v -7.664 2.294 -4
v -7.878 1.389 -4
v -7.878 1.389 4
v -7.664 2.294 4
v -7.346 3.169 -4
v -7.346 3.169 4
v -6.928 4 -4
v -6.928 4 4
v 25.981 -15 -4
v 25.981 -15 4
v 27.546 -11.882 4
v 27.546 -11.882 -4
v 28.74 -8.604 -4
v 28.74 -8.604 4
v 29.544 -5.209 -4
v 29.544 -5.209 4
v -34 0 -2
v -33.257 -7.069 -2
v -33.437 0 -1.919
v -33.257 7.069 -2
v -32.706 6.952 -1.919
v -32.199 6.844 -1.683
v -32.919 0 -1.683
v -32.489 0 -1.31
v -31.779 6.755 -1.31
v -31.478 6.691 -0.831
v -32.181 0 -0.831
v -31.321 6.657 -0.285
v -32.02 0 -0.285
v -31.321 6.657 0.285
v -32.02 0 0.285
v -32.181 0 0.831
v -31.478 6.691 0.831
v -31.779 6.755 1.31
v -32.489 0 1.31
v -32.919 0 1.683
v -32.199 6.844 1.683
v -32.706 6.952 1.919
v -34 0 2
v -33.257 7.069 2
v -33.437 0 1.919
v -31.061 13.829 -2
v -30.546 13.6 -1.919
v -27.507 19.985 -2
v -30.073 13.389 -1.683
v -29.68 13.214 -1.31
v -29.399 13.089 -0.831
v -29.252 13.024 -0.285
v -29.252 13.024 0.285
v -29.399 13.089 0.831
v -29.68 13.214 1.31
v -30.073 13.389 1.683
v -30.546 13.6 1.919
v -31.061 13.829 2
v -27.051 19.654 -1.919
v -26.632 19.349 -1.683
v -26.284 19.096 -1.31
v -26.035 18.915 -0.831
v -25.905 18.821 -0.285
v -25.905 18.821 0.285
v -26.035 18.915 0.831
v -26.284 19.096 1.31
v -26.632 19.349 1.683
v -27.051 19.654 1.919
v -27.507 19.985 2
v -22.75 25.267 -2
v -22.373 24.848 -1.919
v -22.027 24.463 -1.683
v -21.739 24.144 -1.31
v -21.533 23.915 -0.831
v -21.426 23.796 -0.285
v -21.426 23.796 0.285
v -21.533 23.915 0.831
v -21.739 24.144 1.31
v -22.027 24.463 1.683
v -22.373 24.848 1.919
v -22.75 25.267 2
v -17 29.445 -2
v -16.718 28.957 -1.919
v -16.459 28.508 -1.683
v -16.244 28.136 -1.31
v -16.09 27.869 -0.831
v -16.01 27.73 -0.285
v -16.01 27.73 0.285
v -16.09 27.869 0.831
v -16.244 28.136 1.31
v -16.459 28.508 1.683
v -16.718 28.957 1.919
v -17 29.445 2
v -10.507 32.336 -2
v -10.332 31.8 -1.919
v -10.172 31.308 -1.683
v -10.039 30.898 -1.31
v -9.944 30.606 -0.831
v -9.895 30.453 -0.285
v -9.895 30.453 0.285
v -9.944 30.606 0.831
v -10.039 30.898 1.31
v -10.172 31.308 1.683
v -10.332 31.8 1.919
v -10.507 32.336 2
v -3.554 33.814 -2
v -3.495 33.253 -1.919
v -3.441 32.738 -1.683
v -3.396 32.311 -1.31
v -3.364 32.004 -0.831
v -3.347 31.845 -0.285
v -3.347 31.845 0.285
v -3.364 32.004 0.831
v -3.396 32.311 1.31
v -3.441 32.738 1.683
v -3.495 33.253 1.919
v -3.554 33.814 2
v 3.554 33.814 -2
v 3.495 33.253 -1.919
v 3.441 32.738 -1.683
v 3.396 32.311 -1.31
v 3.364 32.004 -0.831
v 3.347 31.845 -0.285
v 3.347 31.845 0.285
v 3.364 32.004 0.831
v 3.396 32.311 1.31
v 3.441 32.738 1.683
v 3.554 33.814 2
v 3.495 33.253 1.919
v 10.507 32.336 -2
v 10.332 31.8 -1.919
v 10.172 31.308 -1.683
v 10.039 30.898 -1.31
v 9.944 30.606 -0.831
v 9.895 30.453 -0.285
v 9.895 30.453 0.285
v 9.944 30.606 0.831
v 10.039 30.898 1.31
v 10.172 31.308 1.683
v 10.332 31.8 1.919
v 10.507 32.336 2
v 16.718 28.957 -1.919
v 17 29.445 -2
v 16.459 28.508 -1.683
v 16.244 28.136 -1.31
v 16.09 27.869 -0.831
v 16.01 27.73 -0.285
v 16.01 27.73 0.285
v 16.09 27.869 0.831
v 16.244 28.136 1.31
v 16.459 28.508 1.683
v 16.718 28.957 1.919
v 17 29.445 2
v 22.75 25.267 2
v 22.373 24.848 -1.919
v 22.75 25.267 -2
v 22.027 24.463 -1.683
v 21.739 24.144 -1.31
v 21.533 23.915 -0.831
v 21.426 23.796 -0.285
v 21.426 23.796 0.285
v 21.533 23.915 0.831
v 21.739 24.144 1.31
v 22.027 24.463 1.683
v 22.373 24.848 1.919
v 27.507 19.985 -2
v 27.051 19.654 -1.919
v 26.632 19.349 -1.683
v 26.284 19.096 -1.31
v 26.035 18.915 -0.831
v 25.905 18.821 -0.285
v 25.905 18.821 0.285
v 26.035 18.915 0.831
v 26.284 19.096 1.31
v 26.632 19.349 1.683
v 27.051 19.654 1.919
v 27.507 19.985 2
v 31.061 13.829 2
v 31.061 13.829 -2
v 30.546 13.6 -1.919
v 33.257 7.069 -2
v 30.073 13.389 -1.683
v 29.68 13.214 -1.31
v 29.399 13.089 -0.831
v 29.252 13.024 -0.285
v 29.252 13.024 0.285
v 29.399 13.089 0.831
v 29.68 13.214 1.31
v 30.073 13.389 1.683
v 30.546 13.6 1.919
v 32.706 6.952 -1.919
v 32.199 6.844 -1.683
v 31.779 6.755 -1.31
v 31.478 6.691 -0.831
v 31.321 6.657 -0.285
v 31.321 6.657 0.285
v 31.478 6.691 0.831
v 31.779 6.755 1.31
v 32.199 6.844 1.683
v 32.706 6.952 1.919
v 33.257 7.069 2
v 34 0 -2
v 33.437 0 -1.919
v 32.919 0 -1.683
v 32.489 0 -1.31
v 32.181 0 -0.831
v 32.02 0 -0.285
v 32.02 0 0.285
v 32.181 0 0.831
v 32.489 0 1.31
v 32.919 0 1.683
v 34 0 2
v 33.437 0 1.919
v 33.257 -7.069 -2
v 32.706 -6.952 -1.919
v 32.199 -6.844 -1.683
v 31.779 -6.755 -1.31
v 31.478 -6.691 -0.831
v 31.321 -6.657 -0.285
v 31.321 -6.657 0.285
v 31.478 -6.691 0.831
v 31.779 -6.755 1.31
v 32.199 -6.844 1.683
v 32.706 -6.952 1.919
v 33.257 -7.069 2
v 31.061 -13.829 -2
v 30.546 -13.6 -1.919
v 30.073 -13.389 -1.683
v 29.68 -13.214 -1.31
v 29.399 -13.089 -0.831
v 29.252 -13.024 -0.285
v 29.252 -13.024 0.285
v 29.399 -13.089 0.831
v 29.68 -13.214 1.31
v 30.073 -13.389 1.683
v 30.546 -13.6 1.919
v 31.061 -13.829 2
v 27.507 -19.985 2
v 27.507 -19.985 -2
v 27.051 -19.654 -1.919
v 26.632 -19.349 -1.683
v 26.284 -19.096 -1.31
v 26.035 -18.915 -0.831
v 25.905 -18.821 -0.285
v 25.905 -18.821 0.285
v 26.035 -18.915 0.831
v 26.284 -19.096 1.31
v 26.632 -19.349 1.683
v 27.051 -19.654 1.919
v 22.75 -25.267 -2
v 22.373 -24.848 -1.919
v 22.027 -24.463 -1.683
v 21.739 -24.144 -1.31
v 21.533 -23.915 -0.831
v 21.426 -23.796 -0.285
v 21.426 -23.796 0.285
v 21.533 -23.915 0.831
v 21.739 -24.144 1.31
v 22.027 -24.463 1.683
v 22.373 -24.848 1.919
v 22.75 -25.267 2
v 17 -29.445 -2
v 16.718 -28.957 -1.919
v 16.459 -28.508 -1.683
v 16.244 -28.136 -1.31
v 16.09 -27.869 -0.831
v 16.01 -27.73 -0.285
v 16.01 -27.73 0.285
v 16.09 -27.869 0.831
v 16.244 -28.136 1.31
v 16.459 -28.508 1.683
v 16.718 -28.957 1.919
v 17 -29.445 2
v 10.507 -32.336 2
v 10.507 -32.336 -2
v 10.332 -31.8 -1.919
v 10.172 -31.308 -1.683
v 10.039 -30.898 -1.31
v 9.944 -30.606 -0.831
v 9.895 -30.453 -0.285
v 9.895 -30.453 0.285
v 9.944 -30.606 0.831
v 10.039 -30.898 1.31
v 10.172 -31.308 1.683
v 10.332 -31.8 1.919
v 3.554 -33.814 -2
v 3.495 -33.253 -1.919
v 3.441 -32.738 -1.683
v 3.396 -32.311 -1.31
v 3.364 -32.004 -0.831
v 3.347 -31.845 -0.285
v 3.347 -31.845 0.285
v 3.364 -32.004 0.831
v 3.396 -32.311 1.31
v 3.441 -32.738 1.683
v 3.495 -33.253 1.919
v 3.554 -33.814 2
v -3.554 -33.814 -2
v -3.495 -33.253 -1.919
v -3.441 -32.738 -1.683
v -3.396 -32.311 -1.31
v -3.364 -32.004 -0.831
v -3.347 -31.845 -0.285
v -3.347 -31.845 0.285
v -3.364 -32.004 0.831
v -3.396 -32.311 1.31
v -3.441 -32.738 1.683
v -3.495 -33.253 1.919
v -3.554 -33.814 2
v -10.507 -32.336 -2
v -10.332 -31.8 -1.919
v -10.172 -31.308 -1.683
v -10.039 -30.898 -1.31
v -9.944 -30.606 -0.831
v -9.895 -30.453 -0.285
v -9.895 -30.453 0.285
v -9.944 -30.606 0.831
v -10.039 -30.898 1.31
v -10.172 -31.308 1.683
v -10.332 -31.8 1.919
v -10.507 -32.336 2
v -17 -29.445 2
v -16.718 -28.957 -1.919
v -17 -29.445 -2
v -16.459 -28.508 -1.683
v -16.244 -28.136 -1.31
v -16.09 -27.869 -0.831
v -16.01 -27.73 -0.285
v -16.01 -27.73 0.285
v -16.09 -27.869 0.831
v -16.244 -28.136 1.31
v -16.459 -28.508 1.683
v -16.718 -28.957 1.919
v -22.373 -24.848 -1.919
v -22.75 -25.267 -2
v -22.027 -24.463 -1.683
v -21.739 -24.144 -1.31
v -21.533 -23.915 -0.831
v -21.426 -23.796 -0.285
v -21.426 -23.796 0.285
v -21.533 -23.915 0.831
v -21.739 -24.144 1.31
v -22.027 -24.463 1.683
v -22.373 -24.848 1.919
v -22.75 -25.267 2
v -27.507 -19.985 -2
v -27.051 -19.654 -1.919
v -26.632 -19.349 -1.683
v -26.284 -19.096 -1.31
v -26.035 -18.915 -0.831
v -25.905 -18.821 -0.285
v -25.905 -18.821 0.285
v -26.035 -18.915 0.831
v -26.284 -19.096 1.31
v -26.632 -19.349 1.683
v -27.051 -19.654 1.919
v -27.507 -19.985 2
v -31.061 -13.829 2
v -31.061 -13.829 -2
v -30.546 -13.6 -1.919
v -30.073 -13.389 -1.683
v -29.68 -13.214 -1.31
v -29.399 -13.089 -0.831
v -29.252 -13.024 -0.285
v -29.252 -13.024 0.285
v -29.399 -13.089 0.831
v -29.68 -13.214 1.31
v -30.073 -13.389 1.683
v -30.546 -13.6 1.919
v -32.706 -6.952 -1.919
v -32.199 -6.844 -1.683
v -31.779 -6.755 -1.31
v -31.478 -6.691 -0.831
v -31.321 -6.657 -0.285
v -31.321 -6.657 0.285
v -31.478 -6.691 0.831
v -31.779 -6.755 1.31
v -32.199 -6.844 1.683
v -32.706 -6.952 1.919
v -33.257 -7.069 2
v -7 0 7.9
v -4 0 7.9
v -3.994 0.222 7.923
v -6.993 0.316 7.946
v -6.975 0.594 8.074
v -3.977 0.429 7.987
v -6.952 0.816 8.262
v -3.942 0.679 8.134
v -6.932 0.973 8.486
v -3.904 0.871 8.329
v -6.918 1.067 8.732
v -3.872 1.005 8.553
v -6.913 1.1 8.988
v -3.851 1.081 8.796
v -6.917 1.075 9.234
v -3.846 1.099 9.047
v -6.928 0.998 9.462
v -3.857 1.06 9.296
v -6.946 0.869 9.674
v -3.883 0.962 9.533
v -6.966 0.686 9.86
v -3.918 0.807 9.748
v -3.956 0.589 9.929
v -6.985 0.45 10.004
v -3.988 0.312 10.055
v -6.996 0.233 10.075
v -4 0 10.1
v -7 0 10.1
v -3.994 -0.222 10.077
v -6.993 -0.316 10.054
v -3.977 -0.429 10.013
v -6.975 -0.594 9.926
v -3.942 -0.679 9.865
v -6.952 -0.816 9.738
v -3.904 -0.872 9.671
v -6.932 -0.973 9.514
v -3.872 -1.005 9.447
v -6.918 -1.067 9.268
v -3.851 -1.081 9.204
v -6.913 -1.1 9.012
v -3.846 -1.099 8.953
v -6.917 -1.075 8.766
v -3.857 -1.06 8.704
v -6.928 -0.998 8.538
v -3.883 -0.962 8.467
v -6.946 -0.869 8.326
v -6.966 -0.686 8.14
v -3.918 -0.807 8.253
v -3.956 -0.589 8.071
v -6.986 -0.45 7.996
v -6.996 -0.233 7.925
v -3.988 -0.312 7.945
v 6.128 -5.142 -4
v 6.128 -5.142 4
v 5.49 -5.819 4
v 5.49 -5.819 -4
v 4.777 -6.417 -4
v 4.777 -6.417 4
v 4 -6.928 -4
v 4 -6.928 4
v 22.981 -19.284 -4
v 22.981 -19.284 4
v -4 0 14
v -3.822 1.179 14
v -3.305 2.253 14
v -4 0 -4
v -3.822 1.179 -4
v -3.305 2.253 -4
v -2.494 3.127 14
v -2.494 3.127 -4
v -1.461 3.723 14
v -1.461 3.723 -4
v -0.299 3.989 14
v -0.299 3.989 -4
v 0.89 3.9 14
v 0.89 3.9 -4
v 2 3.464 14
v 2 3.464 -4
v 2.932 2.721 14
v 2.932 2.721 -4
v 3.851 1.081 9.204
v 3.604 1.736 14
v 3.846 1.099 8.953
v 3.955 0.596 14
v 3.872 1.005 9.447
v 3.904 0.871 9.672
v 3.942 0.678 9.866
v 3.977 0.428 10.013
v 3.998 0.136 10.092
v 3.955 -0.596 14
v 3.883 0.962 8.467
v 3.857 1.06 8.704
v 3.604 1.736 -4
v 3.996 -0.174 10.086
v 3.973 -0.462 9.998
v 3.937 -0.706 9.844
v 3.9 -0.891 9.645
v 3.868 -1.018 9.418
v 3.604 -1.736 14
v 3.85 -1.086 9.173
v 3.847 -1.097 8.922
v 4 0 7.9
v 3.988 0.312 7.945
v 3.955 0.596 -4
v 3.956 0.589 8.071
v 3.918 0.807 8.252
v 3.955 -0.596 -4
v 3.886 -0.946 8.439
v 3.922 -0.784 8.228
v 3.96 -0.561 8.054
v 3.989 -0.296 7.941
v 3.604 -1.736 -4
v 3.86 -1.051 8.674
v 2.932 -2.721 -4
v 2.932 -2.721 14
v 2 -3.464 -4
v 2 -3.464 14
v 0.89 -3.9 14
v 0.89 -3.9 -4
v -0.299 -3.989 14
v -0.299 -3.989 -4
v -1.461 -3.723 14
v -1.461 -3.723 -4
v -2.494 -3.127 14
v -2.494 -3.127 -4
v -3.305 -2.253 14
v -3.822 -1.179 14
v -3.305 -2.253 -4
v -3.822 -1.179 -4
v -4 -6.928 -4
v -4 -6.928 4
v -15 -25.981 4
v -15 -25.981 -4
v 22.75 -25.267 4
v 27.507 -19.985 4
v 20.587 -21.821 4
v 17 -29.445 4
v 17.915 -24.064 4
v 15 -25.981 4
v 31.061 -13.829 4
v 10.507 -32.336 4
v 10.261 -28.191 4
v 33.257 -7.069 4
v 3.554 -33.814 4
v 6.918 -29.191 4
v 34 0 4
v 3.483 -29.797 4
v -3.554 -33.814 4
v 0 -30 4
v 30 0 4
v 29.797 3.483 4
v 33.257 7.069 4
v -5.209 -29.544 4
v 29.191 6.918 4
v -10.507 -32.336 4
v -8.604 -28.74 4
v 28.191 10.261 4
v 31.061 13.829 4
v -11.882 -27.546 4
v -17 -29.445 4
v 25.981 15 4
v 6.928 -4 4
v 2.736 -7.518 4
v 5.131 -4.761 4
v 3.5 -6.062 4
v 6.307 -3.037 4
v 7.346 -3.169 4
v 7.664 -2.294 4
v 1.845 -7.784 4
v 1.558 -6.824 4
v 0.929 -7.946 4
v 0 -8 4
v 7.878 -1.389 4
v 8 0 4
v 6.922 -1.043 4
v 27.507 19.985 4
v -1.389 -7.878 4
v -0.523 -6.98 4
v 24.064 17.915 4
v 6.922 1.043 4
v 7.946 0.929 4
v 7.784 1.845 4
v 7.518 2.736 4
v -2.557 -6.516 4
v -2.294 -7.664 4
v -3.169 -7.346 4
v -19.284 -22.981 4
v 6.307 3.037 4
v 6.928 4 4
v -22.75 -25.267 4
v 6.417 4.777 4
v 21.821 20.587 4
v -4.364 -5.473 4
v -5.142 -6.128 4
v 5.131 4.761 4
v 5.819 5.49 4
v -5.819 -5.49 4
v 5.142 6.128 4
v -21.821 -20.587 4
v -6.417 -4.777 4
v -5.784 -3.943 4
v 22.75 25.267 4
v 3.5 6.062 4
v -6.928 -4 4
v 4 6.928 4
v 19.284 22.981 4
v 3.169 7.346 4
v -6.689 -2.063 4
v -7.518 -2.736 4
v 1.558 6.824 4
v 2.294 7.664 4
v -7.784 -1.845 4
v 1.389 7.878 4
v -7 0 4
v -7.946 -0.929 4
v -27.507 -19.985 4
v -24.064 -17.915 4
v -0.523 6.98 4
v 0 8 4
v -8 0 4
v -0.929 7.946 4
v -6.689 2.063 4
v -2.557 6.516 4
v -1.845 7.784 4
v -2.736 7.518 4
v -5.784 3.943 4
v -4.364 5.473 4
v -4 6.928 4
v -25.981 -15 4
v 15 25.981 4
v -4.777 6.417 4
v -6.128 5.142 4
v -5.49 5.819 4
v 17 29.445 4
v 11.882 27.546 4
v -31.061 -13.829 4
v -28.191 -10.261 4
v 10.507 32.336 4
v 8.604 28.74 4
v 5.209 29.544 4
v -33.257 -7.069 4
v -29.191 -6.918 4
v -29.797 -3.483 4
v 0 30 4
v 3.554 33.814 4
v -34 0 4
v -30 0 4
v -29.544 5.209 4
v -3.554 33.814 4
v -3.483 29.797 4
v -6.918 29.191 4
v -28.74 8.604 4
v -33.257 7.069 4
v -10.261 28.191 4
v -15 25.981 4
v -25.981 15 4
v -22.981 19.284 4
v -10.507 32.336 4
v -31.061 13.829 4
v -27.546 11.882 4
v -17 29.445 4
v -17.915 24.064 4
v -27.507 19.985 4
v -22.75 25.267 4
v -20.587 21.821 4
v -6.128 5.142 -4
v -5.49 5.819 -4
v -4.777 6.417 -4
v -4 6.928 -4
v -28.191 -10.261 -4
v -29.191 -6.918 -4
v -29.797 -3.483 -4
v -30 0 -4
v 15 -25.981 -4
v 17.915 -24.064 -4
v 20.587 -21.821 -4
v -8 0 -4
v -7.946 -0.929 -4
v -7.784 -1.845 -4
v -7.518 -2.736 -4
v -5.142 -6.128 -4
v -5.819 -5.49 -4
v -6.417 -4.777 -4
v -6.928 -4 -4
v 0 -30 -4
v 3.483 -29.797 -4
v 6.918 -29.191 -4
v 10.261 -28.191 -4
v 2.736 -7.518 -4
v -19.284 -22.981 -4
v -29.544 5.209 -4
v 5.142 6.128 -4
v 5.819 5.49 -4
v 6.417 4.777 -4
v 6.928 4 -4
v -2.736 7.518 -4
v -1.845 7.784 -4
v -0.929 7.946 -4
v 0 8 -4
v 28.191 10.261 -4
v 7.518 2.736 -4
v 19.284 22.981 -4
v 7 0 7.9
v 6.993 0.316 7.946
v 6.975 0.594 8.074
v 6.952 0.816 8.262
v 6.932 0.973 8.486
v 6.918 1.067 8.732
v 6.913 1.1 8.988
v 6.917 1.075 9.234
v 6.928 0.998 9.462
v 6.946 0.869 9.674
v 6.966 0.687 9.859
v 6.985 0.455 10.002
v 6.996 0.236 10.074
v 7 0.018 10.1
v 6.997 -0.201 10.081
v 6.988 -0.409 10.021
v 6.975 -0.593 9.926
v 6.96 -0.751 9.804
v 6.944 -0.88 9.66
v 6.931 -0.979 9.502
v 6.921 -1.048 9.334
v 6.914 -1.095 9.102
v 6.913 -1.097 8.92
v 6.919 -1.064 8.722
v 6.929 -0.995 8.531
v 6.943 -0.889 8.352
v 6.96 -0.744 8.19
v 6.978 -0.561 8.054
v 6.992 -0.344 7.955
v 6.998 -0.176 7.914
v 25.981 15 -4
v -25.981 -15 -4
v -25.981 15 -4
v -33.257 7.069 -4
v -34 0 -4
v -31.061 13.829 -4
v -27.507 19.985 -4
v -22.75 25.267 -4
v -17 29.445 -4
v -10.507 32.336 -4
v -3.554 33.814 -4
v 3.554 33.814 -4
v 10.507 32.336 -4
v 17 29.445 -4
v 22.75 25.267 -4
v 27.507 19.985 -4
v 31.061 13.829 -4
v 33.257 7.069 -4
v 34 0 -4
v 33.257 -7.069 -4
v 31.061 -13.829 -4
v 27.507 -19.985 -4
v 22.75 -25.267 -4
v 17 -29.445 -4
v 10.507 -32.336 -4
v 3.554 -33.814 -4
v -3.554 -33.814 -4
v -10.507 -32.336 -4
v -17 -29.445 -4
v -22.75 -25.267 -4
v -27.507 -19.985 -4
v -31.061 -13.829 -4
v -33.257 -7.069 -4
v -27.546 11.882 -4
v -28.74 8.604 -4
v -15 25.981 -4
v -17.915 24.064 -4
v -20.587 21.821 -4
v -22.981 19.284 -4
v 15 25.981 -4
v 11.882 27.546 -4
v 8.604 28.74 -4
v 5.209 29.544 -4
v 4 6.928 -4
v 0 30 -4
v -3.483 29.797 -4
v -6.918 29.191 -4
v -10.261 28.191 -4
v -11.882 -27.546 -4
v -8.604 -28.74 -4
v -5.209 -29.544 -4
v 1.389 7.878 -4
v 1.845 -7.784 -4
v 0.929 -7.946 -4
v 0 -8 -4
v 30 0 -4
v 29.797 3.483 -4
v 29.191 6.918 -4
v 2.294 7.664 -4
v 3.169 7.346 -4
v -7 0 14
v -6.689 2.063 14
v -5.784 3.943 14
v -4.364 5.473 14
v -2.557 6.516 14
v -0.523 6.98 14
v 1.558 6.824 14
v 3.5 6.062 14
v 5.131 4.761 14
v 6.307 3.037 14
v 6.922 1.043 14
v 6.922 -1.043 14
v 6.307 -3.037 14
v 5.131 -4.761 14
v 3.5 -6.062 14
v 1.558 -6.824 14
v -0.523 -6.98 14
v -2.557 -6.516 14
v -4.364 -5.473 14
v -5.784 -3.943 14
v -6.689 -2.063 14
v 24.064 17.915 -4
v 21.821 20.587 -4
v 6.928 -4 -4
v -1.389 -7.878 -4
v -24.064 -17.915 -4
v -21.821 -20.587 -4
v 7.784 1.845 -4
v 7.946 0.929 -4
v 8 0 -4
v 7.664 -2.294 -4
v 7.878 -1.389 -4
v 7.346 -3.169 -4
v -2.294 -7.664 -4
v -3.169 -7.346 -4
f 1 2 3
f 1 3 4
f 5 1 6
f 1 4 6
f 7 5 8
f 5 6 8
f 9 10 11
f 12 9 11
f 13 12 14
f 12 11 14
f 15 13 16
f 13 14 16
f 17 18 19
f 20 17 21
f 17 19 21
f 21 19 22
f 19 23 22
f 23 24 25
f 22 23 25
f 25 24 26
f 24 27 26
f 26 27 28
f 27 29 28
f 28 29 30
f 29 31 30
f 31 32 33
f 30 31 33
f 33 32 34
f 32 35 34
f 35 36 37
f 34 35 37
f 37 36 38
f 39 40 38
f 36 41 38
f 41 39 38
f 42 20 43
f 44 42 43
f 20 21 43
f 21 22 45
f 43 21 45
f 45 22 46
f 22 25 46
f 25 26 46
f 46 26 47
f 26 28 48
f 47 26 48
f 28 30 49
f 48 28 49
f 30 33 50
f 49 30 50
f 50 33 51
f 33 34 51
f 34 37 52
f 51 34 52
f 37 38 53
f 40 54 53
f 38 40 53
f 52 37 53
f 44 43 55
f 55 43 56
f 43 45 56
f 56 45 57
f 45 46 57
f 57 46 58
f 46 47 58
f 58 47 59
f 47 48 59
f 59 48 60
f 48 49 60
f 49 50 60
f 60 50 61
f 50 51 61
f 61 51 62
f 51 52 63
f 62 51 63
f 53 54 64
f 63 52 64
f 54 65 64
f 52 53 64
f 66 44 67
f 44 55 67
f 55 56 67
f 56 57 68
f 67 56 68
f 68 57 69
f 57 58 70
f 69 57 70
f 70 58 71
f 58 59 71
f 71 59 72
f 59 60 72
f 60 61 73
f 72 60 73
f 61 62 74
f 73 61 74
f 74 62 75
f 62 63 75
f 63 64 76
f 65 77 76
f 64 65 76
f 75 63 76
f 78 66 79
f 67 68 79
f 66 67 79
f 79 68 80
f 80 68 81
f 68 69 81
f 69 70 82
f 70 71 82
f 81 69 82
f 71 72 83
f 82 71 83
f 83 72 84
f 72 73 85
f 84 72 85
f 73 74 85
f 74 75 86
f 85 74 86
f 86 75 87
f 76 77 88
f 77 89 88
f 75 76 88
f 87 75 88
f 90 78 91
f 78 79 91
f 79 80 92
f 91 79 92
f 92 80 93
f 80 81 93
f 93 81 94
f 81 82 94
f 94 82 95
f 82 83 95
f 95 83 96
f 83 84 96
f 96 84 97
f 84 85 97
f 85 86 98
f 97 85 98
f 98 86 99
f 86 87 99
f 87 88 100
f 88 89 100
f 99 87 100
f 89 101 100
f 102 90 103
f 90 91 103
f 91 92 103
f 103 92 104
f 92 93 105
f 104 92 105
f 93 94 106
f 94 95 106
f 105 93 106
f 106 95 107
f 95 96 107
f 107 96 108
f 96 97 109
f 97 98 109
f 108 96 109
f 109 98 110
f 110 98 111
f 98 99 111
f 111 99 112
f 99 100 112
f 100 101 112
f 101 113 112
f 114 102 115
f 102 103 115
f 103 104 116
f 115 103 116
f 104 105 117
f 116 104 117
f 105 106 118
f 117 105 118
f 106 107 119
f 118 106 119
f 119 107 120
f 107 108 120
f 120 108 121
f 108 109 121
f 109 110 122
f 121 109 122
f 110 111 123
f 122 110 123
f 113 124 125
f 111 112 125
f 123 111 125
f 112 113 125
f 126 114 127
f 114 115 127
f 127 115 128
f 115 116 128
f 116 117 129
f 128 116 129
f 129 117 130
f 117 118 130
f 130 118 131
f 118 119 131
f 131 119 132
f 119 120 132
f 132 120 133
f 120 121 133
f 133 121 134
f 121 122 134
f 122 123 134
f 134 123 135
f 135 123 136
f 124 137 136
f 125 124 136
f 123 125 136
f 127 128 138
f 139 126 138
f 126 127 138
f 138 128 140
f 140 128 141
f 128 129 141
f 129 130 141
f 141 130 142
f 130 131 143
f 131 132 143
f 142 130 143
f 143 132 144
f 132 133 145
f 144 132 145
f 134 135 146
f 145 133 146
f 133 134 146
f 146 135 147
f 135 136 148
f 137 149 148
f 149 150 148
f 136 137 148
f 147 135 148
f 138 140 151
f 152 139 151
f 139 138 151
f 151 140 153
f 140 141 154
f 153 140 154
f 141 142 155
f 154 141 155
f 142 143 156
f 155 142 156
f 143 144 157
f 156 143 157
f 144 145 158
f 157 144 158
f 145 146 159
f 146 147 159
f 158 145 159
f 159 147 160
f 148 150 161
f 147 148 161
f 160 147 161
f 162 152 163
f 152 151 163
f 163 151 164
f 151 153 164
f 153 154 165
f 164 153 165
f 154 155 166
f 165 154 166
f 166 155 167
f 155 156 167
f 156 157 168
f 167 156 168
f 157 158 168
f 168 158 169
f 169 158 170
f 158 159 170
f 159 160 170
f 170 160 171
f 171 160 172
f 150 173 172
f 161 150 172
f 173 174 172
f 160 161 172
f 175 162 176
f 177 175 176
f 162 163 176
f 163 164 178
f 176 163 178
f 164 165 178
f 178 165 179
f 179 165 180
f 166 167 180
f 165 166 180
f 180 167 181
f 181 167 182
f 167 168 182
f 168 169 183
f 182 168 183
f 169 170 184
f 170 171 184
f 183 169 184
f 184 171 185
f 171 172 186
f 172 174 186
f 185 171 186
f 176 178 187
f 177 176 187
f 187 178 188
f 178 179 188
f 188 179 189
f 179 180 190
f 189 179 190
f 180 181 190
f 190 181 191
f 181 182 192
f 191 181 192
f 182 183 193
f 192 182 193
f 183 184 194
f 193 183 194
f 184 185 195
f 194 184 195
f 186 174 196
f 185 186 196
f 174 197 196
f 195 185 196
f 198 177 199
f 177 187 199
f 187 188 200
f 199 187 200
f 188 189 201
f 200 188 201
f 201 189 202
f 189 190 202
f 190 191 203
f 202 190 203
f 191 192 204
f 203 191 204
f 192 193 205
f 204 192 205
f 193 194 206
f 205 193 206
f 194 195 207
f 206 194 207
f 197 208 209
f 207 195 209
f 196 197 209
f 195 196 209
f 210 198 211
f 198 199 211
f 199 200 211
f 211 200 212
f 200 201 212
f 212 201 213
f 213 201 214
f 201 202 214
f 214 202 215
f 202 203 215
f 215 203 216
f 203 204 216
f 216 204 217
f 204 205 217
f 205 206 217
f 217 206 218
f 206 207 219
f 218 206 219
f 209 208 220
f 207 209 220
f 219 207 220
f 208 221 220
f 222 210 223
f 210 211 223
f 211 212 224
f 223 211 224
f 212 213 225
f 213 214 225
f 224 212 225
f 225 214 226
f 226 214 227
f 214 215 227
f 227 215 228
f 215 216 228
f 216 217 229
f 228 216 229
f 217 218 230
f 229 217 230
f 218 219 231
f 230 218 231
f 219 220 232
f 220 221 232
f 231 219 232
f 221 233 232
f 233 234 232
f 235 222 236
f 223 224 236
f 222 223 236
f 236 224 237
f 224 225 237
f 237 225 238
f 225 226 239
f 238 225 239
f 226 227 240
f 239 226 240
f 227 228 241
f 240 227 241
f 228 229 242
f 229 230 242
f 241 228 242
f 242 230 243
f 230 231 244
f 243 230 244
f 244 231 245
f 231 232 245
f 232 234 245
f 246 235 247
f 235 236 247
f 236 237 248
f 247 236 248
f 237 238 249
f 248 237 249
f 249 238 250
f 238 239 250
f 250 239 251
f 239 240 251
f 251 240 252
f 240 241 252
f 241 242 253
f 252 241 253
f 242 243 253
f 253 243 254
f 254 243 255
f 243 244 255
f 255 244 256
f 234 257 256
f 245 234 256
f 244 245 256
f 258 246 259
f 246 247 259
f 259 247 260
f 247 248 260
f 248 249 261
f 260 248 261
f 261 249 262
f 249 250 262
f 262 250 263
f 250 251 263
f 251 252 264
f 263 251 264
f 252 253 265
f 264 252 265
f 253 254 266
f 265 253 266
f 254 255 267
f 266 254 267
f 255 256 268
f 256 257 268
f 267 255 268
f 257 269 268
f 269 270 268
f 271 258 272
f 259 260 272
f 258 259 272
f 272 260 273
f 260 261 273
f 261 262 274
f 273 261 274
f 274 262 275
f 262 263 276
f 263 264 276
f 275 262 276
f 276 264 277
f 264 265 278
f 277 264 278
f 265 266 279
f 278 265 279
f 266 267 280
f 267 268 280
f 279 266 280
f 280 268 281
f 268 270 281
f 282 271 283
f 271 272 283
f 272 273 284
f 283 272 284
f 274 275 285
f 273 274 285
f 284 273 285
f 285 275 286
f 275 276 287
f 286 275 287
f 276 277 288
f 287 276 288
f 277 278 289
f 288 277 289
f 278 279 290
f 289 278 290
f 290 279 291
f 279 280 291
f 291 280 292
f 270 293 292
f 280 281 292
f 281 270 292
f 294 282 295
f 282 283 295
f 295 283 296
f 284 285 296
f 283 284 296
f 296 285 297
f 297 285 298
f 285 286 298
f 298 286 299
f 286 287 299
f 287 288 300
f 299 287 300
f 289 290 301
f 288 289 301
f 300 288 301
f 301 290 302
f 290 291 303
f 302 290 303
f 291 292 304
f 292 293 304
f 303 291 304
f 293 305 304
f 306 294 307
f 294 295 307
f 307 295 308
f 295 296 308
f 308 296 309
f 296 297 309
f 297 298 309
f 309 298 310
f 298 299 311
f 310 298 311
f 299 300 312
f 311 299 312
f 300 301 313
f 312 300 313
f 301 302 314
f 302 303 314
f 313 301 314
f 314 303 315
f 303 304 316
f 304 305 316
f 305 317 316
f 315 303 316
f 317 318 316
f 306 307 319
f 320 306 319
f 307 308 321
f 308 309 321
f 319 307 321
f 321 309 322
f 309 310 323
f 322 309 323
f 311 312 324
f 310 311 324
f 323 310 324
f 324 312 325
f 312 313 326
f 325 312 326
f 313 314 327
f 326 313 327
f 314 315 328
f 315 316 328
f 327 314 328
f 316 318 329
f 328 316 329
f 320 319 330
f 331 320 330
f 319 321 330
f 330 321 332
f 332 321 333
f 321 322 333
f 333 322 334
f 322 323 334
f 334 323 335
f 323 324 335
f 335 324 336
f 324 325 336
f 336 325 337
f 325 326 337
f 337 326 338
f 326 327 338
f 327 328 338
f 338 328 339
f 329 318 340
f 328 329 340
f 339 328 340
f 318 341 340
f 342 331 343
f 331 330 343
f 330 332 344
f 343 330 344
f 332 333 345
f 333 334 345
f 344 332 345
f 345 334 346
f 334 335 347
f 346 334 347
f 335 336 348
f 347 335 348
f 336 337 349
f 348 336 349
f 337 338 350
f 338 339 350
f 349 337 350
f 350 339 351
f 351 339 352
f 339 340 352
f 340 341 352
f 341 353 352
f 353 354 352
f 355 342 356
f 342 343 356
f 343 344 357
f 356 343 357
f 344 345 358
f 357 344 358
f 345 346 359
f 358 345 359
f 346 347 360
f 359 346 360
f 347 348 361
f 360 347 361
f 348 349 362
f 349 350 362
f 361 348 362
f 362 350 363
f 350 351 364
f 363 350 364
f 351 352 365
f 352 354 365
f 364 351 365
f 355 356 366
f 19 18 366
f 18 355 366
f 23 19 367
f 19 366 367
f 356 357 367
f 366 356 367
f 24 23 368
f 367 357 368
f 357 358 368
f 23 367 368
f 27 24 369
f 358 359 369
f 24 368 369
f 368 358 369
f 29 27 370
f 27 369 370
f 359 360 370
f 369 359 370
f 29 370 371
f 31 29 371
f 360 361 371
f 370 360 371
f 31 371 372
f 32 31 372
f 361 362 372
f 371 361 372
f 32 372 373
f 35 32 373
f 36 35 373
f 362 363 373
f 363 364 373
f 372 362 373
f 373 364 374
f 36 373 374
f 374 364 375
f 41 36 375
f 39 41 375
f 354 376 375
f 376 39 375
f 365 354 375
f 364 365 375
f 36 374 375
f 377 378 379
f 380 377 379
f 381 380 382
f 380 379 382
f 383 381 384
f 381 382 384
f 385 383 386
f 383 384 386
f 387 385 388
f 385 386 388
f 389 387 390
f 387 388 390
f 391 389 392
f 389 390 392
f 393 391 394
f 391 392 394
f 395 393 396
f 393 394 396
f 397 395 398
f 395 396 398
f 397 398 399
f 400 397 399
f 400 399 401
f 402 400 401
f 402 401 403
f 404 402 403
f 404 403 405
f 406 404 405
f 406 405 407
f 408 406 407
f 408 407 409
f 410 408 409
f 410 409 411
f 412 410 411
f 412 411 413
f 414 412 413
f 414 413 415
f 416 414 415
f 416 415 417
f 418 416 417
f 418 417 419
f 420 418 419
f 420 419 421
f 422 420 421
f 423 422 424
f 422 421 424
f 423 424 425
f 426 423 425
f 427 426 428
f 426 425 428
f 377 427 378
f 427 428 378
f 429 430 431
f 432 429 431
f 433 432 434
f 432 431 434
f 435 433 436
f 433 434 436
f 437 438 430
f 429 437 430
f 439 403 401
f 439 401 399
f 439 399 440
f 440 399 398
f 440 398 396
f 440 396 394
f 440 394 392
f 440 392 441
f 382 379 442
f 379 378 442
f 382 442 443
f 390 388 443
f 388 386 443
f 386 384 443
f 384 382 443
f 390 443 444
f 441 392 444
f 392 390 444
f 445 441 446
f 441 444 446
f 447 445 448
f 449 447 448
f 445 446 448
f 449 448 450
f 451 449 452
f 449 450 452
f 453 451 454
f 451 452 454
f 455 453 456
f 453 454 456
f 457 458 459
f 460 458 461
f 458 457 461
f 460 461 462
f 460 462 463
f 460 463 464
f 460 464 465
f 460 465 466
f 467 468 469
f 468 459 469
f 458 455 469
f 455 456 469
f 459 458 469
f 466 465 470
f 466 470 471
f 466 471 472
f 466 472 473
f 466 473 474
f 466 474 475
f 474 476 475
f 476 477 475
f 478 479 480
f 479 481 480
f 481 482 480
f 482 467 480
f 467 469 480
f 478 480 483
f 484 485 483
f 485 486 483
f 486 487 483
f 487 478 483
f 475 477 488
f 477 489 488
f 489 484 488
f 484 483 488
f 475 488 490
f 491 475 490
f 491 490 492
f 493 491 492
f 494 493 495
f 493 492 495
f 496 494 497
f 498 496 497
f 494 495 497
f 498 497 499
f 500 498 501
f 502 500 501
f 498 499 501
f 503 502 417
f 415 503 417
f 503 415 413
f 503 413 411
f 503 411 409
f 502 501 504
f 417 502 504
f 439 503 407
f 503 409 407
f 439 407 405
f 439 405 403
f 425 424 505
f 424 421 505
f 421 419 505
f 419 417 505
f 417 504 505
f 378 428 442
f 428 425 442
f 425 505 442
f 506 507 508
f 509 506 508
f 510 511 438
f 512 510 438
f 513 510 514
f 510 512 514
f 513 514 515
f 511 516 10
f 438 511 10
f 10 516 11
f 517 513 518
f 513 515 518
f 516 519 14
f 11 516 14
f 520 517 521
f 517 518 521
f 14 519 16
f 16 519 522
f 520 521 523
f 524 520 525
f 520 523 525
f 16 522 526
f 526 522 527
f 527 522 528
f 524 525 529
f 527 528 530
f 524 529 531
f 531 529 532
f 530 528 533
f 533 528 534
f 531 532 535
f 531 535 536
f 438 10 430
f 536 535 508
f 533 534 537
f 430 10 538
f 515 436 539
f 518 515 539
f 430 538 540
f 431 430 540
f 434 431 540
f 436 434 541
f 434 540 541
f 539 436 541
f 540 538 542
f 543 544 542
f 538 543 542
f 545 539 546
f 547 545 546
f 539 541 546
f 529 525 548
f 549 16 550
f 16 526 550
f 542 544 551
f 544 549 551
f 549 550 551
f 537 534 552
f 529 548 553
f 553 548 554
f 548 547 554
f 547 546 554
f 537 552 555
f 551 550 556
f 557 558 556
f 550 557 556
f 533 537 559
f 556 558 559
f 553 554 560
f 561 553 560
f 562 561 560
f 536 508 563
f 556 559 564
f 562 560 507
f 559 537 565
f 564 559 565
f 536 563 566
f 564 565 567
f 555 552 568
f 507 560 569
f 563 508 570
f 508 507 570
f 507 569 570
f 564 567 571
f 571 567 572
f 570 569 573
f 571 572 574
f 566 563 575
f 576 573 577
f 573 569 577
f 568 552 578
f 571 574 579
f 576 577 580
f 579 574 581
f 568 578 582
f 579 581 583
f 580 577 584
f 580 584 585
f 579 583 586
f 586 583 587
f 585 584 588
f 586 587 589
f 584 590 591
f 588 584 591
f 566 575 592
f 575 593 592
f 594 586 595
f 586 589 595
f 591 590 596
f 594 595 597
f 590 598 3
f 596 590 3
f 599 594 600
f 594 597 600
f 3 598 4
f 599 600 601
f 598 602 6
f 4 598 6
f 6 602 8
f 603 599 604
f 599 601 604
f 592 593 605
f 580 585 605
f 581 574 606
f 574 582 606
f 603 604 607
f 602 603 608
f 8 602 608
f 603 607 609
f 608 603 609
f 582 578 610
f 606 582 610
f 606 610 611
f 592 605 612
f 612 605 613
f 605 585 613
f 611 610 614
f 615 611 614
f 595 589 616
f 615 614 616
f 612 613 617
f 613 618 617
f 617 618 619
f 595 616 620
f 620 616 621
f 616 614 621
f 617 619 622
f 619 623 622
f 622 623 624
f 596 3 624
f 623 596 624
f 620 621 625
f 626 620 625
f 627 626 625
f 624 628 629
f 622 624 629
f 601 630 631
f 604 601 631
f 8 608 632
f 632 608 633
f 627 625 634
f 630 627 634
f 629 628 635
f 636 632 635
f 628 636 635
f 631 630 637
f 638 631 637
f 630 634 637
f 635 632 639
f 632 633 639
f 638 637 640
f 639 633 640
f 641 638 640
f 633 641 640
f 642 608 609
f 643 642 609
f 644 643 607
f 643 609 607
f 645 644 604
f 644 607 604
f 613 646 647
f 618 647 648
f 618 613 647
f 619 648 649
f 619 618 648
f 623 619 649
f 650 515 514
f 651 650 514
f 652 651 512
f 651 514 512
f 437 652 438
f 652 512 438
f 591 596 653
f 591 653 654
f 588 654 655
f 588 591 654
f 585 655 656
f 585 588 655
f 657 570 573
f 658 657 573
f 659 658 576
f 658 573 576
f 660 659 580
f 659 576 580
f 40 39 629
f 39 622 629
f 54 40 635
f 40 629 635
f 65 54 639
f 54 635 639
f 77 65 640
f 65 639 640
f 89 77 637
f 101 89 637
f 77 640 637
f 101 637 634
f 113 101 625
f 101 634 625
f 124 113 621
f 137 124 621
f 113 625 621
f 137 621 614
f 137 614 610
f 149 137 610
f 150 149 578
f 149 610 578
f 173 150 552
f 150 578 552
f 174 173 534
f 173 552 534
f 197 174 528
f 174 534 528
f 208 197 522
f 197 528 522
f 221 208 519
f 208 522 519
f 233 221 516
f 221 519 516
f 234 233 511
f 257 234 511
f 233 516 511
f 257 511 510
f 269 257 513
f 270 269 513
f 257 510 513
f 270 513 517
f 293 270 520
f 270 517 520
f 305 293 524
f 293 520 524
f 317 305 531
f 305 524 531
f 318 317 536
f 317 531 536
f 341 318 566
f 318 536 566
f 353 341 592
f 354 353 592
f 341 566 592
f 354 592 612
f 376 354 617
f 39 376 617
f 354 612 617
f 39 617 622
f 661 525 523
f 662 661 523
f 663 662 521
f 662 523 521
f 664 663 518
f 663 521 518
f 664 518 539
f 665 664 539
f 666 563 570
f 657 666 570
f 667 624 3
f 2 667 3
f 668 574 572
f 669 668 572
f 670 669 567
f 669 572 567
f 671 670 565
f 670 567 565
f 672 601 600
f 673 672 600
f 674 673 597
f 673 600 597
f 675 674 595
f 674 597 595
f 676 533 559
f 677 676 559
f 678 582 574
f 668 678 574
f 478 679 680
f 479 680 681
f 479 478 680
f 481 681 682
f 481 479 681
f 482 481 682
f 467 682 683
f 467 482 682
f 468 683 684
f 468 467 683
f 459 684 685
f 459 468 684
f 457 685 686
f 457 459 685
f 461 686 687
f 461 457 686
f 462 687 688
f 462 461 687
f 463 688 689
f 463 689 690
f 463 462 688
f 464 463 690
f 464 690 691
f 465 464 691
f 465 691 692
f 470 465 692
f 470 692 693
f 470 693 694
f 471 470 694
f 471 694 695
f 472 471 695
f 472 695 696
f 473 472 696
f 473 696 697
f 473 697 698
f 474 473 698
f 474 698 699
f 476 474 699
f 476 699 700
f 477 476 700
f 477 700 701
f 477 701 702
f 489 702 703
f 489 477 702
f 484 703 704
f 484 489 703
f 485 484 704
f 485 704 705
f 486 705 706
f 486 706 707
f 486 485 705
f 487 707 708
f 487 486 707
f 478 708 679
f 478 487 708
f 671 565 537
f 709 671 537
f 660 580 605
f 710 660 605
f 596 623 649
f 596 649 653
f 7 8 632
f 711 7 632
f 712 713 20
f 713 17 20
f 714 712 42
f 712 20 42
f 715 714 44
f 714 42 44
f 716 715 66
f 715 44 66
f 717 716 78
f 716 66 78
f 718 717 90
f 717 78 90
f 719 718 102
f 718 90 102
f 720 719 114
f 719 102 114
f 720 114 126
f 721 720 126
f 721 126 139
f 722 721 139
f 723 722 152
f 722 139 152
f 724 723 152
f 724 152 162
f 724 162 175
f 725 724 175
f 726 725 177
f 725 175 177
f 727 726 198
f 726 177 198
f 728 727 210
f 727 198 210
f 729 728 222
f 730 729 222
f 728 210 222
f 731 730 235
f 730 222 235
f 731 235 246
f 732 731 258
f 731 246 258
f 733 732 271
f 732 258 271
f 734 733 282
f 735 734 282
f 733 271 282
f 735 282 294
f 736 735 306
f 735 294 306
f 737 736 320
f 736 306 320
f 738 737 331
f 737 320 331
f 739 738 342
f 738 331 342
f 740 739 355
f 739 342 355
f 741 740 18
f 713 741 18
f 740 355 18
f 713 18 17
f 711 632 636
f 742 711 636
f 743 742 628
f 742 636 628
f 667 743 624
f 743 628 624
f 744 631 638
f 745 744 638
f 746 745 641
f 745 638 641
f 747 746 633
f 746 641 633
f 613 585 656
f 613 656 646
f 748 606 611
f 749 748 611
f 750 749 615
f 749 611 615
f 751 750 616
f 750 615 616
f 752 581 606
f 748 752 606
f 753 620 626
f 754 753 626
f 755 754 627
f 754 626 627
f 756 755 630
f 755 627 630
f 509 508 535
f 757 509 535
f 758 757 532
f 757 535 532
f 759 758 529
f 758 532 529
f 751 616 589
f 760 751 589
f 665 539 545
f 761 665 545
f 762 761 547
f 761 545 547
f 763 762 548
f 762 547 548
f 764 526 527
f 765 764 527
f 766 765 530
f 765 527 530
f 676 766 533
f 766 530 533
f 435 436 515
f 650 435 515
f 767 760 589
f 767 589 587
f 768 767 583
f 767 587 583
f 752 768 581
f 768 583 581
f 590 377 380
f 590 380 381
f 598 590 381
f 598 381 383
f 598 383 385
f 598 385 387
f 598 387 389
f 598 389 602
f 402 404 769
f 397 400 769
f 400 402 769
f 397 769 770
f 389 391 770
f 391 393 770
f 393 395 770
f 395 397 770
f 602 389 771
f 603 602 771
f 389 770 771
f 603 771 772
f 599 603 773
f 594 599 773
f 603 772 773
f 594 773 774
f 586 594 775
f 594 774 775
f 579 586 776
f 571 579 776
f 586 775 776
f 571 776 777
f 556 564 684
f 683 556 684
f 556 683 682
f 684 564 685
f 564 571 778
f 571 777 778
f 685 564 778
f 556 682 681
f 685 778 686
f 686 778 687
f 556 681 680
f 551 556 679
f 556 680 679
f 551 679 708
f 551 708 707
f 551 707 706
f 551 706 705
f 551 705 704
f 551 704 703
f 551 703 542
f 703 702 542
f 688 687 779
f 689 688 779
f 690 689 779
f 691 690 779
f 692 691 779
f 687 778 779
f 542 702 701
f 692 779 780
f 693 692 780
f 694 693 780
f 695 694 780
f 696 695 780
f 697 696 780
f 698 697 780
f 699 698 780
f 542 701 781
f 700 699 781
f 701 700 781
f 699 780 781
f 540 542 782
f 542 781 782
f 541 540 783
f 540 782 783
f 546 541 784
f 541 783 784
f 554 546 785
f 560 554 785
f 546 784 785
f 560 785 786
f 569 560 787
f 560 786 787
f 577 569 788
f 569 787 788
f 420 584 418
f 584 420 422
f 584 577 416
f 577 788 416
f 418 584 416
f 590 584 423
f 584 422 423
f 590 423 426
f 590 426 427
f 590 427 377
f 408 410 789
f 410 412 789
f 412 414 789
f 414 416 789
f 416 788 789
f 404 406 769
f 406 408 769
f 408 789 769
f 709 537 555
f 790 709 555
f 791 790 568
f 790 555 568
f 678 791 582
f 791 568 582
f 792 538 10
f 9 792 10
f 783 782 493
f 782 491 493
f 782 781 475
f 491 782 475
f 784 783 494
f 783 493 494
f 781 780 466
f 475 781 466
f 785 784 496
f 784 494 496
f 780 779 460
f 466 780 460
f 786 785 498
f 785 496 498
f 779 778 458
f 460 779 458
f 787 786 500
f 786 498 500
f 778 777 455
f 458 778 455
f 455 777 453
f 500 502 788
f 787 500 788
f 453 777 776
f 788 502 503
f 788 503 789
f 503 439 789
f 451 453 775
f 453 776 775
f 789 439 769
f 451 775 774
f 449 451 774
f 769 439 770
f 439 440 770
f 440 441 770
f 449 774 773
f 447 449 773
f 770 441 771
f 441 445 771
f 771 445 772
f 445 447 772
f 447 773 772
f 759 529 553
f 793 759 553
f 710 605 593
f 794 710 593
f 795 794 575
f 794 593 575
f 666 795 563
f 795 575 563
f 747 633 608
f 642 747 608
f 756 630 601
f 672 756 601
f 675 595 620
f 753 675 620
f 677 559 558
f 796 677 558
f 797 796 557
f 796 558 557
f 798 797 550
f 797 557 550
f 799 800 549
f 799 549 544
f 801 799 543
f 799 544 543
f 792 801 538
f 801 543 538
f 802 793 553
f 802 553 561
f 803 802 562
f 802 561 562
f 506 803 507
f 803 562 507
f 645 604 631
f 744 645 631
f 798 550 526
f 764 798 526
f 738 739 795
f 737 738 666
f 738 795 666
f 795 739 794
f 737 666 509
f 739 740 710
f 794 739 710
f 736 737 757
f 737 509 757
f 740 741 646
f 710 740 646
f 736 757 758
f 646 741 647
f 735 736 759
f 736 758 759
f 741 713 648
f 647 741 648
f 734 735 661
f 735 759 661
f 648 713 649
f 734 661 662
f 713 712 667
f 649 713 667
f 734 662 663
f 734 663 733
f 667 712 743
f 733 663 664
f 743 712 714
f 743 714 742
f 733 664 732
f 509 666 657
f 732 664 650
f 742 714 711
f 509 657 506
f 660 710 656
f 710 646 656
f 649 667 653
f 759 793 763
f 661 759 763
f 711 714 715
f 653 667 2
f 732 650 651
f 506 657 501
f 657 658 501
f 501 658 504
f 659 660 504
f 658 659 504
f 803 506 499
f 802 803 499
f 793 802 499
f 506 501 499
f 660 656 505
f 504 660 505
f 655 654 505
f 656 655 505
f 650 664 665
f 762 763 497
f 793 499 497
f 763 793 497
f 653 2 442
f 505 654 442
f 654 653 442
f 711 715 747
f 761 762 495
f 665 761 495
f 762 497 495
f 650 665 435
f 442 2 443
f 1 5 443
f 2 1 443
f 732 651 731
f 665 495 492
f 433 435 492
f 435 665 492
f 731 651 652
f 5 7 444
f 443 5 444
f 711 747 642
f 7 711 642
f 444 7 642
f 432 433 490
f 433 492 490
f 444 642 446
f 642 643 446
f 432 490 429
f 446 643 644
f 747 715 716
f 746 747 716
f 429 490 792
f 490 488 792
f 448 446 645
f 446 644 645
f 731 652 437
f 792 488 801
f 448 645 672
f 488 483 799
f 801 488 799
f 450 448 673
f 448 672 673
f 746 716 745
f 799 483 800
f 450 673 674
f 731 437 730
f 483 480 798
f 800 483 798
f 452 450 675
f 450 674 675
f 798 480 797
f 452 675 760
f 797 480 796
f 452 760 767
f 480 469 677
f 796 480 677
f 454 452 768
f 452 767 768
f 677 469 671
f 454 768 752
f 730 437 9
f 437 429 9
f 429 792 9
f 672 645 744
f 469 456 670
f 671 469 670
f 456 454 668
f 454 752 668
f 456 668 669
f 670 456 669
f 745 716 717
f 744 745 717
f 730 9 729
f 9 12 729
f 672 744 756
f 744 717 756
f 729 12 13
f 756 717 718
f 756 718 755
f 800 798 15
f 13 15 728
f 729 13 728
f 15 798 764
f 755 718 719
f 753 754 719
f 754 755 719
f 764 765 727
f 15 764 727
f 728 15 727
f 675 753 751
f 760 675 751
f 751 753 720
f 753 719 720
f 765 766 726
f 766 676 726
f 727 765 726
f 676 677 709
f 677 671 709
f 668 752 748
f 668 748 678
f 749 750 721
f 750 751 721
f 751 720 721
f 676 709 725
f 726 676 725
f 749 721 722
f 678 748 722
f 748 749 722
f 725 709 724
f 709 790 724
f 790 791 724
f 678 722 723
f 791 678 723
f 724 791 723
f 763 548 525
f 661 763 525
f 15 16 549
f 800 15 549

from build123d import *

# Parameters (mm, degrees)
CUT_EXTRUDE_1_REACH             = 10
CUT_EXTRUDE_2_REACH             = 36
SKETCH_4_R                      = 1.1
CUT_EXTRUDE_2_DIRECTION_2_REACH = 36


with BuildPart() as part:
    # 草图2 → 旋转1 (revolve)
    with BuildSketch(Plane(origin=(0, 0, 0), x_dir=(1, 0, 0), z_dir=(0, 1, 0))):
        with BuildLine():
            Line((-4, -4), (-4, 4))
            Line((-4, 4), (-34, 4))
            Line((-34, 4), (-34, 2))
            ThreePointArc((-34, 2), (-32, 0), (-34, -2))
            Line((-34, -2), (-34, -4))
            Line((-34, -4), (-7, -4))
            Line((-7, -4), (-7, -14))
            Line((-7, -14), (-4, -14))
            Line((-4, -14), (-4, -4))
        make_face()
    revolve(axis=Axis((0, 0, 0), (0, 0, -1)))

    # 草图3 → 切除-拉伸1 (cut, up to next)
    with BuildSketch(Plane.XY.offset(4), mode=Mode.PRIVATE) as cut_extrude_1_sk1:
        with BuildLine():
            Line((-30, 0), (-8, 0))
            ThreePointArc((-8, 0), (-7.878462024, -1.389185421), (-7.517540966, -2.736161147))
            Line((-7.517540966, -2.736161147), (-28.190778624, -10.2606043))
            ThreePointArc((-28.190778624, -10.2606043), (-29.54423259, -5.20944533), (-30, 0))
        make_face()
    cut_extrude_1_tool1 = extrude(cut_extrude_1_sk1.sketch, amount=-CUT_EXTRUDE_1_REACH, mode=Mode.PRIVATE) & part.part
    add(cut_extrude_1_tool1.solids().sort_by_distance((-20.696454, -3.649343, 4))[0], mode=Mode.SUBTRACT)
    # 草图3 → 切除-拉伸1 (cut, up to next)
    with BuildSketch(Plane.XY.offset(4), mode=Mode.PRIVATE) as cut_extrude_1_sk2:
        with BuildLine():
            Line((-29.54423259, 5.20944533), (-7.878462024, 1.389185421))
            ThreePointArc((-7.878462024, 1.389185421), (-7.517540966, 2.736161147), (-6.92820323, 4))
            Line((-6.92820323, 4), (-25.980762114, 15))
            ThreePointArc((-25.980762114, 15), (-28.190778624, 10.2606043), (-29.54423259, 5.20944533))
        make_face()
    cut_extrude_1_tool2 = extrude(cut_extrude_1_sk2.sketch, amount=-CUT_EXTRUDE_1_REACH, mode=Mode.PRIVATE) & part.part
    add(cut_extrude_1_tool2.solids().sort_by_distance((-19.748327, 7.187803, 4))[0], mode=Mode.SUBTRACT)
    # 草图3 → 切除-拉伸1 (cut, up to next)
    with BuildSketch(Plane.XY.offset(4), mode=Mode.PRIVATE) as cut_extrude_1_sk3:
        with BuildLine():
            Line((-22.981333294, 19.283628291), (-6.128355545, 5.142300877))
            ThreePointArc((-6.128355545, 5.142300877), (-5.142300877, 6.128355545), (-4, 6.92820323))
            Line((-4, 6.92820323), (-15, 25.980762114))
            ThreePointArc((-15, 25.980762114), (-19.283628291, 22.981333294), (-22.981333294, 19.283628291))
        make_face()
    cut_extrude_1_tool3 = extrude(cut_extrude_1_sk3.sketch, amount=-CUT_EXTRUDE_1_REACH, mode=Mode.PRIVATE) & part.part
    add(cut_extrude_1_tool3.solids().sort_by_distance((-13.508651, 16.098984, 4))[0], mode=Mode.SUBTRACT)
    # 草图3 → 切除-拉伸1 (cut, up to next)
    with BuildSketch(Plane.XY.offset(4), mode=Mode.PRIVATE) as cut_extrude_1_sk4:
        with BuildLine():
            Line((-10.2606043, 28.190778624), (-2.736161147, 7.517540966))
            ThreePointArc((-2.736161147, 7.517540966), (-1.389185421, 7.878462024), (0, 8))
            Line((0, 8), (0, 30))
            ThreePointArc((0, 30), (-5.20944533, 29.54423259), (-10.2606043, 28.190778624))
        make_face()
    cut_extrude_1_tool4 = extrude(cut_extrude_1_sk4.sketch, amount=-CUT_EXTRUDE_1_REACH, mode=Mode.PRIVATE) & part.part
    add(cut_extrude_1_tool4.solids().sort_by_distance((-3.649343, 20.696454, 4))[0], mode=Mode.SUBTRACT)
    # 草图3 → 切除-拉伸1 (cut, up to next)
    with BuildSketch(Plane.XY.offset(4), mode=Mode.PRIVATE) as cut_extrude_1_sk5:
        with BuildLine():
            Line((5.20944533, 29.54423259), (1.389185421, 7.878462024))
            ThreePointArc((1.389185421, 7.878462024), (2.736161147, 7.517540966), (4, 6.92820323))
            Line((4, 6.92820323), (15, 25.980762114))
            ThreePointArc((15, 25.980762114), (10.2606043, 28.190778624), (5.20944533, 29.54423259))
        make_face()
    cut_extrude_1_tool5 = extrude(cut_extrude_1_sk5.sketch, amount=-CUT_EXTRUDE_1_REACH, mode=Mode.PRIVATE) & part.part
    add(cut_extrude_1_tool5.solids().sort_by_distance((7.187803, 19.748327, 4))[0], mode=Mode.SUBTRACT)
    # 草图3 → 切除-拉伸1 (cut, up to next)
    with BuildSketch(Plane.XY.offset(4), mode=Mode.PRIVATE) as cut_extrude_1_sk6:
        with BuildLine():
            Line((19.283628291, 22.981333294), (5.142300877, 6.128355545))
            ThreePointArc((5.142300877, 6.128355545), (6.128355545, 5.142300877), (6.92820323, 4))
            Line((6.92820323, 4), (25.980762114, 15))
            ThreePointArc((25.980762114, 15), (22.981333294, 19.283628291), (19.283628291, 22.981333294))
        make_face()
    cut_extrude_1_tool6 = extrude(cut_extrude_1_sk6.sketch, amount=-CUT_EXTRUDE_1_REACH, mode=Mode.PRIVATE) & part.part
    add(cut_extrude_1_tool6.solids().sort_by_distance((16.098984, 13.508651, 4))[0], mode=Mode.SUBTRACT)
    # 草图3 → 切除-拉伸1 (cut, up to next)
    with BuildSketch(Plane.XY.offset(4), mode=Mode.PRIVATE) as cut_extrude_1_sk7:
        with BuildLine():
            Line((28.190778624, 10.2606043), (7.517540966, 2.736161147))
            ThreePointArc((7.517540966, 2.736161147), (7.878462024, 1.389185421), (8, 0))
            Line((8, 0), (30, 0))
            ThreePointArc((30, 0), (29.54423259, 5.20944533), (28.190778624, 10.2606043))
        make_face()
    cut_extrude_1_tool7 = extrude(cut_extrude_1_sk7.sketch, amount=-CUT_EXTRUDE_1_REACH, mode=Mode.PRIVATE) & part.part
    add(cut_extrude_1_tool7.solids().sort_by_distance((20.696454, 3.649343, 4))[0], mode=Mode.SUBTRACT)
    # 草图3 → 切除-拉伸1 (cut, up to next)
    with BuildSketch(Plane.XY.offset(4), mode=Mode.PRIVATE) as cut_extrude_1_sk8:
        with BuildLine():
            Line((29.54423259, -5.20944533), (7.878462024, -1.389185421))
            ThreePointArc((7.878462024, -1.389185421), (7.517540966, -2.736161147), (6.92820323, -4))
            Line((6.92820323, -4), (25.980762114, -15))
            ThreePointArc((25.980762114, -15), (28.190778624, -10.2606043), (29.54423259, -5.20944533))
        make_face()
    cut_extrude_1_tool8 = extrude(cut_extrude_1_sk8.sketch, amount=-CUT_EXTRUDE_1_REACH, mode=Mode.PRIVATE) & part.part
    add(cut_extrude_1_tool8.solids().sort_by_distance((19.748327, -7.187803, 4))[0], mode=Mode.SUBTRACT)
    # 草图3 → 切除-拉伸1 (cut, up to next)
    with BuildSketch(Plane.XY.offset(4), mode=Mode.PRIVATE) as cut_extrude_1_sk9:
        with BuildLine():
            Line((22.981333294, -19.283628291), (6.128355545, -5.142300877))
            ThreePointArc((6.128355545, -5.142300877), (5.142300877, -6.128355545), (4, -6.92820323))
            Line((4, -6.92820323), (15, -25.980762114))
            ThreePointArc((15, -25.980762114), (19.283628291, -22.981333294), (22.981333294, -19.283628291))
        make_face()
    cut_extrude_1_tool9 = extrude(cut_extrude_1_sk9.sketch, amount=-CUT_EXTRUDE_1_REACH, mode=Mode.PRIVATE) & part.part
    add(cut_extrude_1_tool9.solids().sort_by_distance((13.508651, -16.098984, 4))[0], mode=Mode.SUBTRACT)
    # 草图3 → 切除-拉伸1 (cut, up to next)
    with BuildSketch(Plane.XY.offset(4), mode=Mode.PRIVATE) as cut_extrude_1_sk10:
        with BuildLine():
            Line((10.2606043, -28.190778624), (2.736161147, -7.517540966))
            ThreePointArc((2.736161147, -7.517540966), (1.389185421, -7.878462024), (0, -8))
            Line((0, -8), (0, -30))
            ThreePointArc((0, -30), (5.20944533, -29.54423259), (10.2606043, -28.190778624))
        make_face()
    cut_extrude_1_tool10 = extrude(cut_extrude_1_sk10.sketch, amount=-CUT_EXTRUDE_1_REACH, mode=Mode.PRIVATE) & part.part
    add(cut_extrude_1_tool10.solids().sort_by_distance((3.649343, -20.696454, 4))[0], mode=Mode.SUBTRACT)
    # 草图3 → 切除-拉伸1 (cut, up to next)
    with BuildSketch(Plane.XY.offset(4), mode=Mode.PRIVATE) as cut_extrude_1_sk11:
        with BuildLine():
            Line((-5.20944533, -29.54423259), (-1.389185421, -7.878462024))
            ThreePointArc((-1.389185421, -7.878462024), (-2.736161147, -7.517540966), (-4, -6.92820323))
            Line((-4, -6.92820323), (-15, -25.980762114))
            ThreePointArc((-15, -25.980762114), (-10.2606043, -28.190778624), (-5.20944533, -29.54423259))
        make_face()
    cut_extrude_1_tool11 = extrude(cut_extrude_1_sk11.sketch, amount=-CUT_EXTRUDE_1_REACH, mode=Mode.PRIVATE) & part.part
    add(cut_extrude_1_tool11.solids().sort_by_distance((-7.187803, -19.748327, 4))[0], mode=Mode.SUBTRACT)
    # 草图3 → 切除-拉伸1 (cut, up to next)
    with BuildSketch(Plane.XY.offset(4), mode=Mode.PRIVATE) as cut_extrude_1_sk12:
        with BuildLine():
            Line((-19.283628291, -22.981333294), (-5.142300877, -6.128355545))
            ThreePointArc((-5.142300877, -6.128355545), (-6.128355545, -5.142300877), (-6.92820323, -4))
            Line((-6.92820323, -4), (-25.980762114, -15))
            ThreePointArc((-25.980762114, -15), (-22.981333294, -19.283628291), (-19.283628291, -22.981333294))
        make_face()
    cut_extrude_1_tool12 = extrude(cut_extrude_1_sk12.sketch, amount=-CUT_EXTRUDE_1_REACH, mode=Mode.PRIVATE) & part.part
    add(cut_extrude_1_tool12.solids().sort_by_distance((-16.098984, -13.508651, 4))[0], mode=Mode.SUBTRACT)

    # 草图4 → 切除-拉伸2 (cut, up to next)
    with BuildSketch(Plane(origin=(0, 0, 0), x_dir=(0, 0, -1), z_dir=(1, 0, 0)), mode=Mode.PRIVATE) as cut_extrude_2_sk1:
        with Locations((-9, 0)):
            Circle(SKETCH_4_R)
    cut_extrude_2_tool1 = extrude(cut_extrude_2_sk1.sketch, amount=-CUT_EXTRUDE_2_REACH, mode=Mode.PRIVATE) & part.part
    add(cut_extrude_2_tool1.solids().sort_by_distance((0, 0, 9))[0], mode=Mode.SUBTRACT)

    # 草图4 → 切除-拉伸2 direction 2 (cut, up to next)
    with BuildSketch(Plane(origin=(0, 0, 0), x_dir=(0, 0, -1), z_dir=(1, 0, 0)), mode=Mode.PRIVATE) as cut_extrude_2_direction_2_sk1:
        with Locations((-9, 0)):
            Circle(SKETCH_4_R)
    cut_extrude_2_direction_2_tool1 = extrude(cut_extrude_2_direction_2_sk1.sketch, amount=CUT_EXTRUDE_2_DIRECTION_2_REACH, mode=Mode.PRIVATE) & part.part
    add(cut_extrude_2_direction_2_tool1.solids().sort_by_distance((0, 0, 9))[0], mode=Mode.SUBTRACT)


solid = part.part
